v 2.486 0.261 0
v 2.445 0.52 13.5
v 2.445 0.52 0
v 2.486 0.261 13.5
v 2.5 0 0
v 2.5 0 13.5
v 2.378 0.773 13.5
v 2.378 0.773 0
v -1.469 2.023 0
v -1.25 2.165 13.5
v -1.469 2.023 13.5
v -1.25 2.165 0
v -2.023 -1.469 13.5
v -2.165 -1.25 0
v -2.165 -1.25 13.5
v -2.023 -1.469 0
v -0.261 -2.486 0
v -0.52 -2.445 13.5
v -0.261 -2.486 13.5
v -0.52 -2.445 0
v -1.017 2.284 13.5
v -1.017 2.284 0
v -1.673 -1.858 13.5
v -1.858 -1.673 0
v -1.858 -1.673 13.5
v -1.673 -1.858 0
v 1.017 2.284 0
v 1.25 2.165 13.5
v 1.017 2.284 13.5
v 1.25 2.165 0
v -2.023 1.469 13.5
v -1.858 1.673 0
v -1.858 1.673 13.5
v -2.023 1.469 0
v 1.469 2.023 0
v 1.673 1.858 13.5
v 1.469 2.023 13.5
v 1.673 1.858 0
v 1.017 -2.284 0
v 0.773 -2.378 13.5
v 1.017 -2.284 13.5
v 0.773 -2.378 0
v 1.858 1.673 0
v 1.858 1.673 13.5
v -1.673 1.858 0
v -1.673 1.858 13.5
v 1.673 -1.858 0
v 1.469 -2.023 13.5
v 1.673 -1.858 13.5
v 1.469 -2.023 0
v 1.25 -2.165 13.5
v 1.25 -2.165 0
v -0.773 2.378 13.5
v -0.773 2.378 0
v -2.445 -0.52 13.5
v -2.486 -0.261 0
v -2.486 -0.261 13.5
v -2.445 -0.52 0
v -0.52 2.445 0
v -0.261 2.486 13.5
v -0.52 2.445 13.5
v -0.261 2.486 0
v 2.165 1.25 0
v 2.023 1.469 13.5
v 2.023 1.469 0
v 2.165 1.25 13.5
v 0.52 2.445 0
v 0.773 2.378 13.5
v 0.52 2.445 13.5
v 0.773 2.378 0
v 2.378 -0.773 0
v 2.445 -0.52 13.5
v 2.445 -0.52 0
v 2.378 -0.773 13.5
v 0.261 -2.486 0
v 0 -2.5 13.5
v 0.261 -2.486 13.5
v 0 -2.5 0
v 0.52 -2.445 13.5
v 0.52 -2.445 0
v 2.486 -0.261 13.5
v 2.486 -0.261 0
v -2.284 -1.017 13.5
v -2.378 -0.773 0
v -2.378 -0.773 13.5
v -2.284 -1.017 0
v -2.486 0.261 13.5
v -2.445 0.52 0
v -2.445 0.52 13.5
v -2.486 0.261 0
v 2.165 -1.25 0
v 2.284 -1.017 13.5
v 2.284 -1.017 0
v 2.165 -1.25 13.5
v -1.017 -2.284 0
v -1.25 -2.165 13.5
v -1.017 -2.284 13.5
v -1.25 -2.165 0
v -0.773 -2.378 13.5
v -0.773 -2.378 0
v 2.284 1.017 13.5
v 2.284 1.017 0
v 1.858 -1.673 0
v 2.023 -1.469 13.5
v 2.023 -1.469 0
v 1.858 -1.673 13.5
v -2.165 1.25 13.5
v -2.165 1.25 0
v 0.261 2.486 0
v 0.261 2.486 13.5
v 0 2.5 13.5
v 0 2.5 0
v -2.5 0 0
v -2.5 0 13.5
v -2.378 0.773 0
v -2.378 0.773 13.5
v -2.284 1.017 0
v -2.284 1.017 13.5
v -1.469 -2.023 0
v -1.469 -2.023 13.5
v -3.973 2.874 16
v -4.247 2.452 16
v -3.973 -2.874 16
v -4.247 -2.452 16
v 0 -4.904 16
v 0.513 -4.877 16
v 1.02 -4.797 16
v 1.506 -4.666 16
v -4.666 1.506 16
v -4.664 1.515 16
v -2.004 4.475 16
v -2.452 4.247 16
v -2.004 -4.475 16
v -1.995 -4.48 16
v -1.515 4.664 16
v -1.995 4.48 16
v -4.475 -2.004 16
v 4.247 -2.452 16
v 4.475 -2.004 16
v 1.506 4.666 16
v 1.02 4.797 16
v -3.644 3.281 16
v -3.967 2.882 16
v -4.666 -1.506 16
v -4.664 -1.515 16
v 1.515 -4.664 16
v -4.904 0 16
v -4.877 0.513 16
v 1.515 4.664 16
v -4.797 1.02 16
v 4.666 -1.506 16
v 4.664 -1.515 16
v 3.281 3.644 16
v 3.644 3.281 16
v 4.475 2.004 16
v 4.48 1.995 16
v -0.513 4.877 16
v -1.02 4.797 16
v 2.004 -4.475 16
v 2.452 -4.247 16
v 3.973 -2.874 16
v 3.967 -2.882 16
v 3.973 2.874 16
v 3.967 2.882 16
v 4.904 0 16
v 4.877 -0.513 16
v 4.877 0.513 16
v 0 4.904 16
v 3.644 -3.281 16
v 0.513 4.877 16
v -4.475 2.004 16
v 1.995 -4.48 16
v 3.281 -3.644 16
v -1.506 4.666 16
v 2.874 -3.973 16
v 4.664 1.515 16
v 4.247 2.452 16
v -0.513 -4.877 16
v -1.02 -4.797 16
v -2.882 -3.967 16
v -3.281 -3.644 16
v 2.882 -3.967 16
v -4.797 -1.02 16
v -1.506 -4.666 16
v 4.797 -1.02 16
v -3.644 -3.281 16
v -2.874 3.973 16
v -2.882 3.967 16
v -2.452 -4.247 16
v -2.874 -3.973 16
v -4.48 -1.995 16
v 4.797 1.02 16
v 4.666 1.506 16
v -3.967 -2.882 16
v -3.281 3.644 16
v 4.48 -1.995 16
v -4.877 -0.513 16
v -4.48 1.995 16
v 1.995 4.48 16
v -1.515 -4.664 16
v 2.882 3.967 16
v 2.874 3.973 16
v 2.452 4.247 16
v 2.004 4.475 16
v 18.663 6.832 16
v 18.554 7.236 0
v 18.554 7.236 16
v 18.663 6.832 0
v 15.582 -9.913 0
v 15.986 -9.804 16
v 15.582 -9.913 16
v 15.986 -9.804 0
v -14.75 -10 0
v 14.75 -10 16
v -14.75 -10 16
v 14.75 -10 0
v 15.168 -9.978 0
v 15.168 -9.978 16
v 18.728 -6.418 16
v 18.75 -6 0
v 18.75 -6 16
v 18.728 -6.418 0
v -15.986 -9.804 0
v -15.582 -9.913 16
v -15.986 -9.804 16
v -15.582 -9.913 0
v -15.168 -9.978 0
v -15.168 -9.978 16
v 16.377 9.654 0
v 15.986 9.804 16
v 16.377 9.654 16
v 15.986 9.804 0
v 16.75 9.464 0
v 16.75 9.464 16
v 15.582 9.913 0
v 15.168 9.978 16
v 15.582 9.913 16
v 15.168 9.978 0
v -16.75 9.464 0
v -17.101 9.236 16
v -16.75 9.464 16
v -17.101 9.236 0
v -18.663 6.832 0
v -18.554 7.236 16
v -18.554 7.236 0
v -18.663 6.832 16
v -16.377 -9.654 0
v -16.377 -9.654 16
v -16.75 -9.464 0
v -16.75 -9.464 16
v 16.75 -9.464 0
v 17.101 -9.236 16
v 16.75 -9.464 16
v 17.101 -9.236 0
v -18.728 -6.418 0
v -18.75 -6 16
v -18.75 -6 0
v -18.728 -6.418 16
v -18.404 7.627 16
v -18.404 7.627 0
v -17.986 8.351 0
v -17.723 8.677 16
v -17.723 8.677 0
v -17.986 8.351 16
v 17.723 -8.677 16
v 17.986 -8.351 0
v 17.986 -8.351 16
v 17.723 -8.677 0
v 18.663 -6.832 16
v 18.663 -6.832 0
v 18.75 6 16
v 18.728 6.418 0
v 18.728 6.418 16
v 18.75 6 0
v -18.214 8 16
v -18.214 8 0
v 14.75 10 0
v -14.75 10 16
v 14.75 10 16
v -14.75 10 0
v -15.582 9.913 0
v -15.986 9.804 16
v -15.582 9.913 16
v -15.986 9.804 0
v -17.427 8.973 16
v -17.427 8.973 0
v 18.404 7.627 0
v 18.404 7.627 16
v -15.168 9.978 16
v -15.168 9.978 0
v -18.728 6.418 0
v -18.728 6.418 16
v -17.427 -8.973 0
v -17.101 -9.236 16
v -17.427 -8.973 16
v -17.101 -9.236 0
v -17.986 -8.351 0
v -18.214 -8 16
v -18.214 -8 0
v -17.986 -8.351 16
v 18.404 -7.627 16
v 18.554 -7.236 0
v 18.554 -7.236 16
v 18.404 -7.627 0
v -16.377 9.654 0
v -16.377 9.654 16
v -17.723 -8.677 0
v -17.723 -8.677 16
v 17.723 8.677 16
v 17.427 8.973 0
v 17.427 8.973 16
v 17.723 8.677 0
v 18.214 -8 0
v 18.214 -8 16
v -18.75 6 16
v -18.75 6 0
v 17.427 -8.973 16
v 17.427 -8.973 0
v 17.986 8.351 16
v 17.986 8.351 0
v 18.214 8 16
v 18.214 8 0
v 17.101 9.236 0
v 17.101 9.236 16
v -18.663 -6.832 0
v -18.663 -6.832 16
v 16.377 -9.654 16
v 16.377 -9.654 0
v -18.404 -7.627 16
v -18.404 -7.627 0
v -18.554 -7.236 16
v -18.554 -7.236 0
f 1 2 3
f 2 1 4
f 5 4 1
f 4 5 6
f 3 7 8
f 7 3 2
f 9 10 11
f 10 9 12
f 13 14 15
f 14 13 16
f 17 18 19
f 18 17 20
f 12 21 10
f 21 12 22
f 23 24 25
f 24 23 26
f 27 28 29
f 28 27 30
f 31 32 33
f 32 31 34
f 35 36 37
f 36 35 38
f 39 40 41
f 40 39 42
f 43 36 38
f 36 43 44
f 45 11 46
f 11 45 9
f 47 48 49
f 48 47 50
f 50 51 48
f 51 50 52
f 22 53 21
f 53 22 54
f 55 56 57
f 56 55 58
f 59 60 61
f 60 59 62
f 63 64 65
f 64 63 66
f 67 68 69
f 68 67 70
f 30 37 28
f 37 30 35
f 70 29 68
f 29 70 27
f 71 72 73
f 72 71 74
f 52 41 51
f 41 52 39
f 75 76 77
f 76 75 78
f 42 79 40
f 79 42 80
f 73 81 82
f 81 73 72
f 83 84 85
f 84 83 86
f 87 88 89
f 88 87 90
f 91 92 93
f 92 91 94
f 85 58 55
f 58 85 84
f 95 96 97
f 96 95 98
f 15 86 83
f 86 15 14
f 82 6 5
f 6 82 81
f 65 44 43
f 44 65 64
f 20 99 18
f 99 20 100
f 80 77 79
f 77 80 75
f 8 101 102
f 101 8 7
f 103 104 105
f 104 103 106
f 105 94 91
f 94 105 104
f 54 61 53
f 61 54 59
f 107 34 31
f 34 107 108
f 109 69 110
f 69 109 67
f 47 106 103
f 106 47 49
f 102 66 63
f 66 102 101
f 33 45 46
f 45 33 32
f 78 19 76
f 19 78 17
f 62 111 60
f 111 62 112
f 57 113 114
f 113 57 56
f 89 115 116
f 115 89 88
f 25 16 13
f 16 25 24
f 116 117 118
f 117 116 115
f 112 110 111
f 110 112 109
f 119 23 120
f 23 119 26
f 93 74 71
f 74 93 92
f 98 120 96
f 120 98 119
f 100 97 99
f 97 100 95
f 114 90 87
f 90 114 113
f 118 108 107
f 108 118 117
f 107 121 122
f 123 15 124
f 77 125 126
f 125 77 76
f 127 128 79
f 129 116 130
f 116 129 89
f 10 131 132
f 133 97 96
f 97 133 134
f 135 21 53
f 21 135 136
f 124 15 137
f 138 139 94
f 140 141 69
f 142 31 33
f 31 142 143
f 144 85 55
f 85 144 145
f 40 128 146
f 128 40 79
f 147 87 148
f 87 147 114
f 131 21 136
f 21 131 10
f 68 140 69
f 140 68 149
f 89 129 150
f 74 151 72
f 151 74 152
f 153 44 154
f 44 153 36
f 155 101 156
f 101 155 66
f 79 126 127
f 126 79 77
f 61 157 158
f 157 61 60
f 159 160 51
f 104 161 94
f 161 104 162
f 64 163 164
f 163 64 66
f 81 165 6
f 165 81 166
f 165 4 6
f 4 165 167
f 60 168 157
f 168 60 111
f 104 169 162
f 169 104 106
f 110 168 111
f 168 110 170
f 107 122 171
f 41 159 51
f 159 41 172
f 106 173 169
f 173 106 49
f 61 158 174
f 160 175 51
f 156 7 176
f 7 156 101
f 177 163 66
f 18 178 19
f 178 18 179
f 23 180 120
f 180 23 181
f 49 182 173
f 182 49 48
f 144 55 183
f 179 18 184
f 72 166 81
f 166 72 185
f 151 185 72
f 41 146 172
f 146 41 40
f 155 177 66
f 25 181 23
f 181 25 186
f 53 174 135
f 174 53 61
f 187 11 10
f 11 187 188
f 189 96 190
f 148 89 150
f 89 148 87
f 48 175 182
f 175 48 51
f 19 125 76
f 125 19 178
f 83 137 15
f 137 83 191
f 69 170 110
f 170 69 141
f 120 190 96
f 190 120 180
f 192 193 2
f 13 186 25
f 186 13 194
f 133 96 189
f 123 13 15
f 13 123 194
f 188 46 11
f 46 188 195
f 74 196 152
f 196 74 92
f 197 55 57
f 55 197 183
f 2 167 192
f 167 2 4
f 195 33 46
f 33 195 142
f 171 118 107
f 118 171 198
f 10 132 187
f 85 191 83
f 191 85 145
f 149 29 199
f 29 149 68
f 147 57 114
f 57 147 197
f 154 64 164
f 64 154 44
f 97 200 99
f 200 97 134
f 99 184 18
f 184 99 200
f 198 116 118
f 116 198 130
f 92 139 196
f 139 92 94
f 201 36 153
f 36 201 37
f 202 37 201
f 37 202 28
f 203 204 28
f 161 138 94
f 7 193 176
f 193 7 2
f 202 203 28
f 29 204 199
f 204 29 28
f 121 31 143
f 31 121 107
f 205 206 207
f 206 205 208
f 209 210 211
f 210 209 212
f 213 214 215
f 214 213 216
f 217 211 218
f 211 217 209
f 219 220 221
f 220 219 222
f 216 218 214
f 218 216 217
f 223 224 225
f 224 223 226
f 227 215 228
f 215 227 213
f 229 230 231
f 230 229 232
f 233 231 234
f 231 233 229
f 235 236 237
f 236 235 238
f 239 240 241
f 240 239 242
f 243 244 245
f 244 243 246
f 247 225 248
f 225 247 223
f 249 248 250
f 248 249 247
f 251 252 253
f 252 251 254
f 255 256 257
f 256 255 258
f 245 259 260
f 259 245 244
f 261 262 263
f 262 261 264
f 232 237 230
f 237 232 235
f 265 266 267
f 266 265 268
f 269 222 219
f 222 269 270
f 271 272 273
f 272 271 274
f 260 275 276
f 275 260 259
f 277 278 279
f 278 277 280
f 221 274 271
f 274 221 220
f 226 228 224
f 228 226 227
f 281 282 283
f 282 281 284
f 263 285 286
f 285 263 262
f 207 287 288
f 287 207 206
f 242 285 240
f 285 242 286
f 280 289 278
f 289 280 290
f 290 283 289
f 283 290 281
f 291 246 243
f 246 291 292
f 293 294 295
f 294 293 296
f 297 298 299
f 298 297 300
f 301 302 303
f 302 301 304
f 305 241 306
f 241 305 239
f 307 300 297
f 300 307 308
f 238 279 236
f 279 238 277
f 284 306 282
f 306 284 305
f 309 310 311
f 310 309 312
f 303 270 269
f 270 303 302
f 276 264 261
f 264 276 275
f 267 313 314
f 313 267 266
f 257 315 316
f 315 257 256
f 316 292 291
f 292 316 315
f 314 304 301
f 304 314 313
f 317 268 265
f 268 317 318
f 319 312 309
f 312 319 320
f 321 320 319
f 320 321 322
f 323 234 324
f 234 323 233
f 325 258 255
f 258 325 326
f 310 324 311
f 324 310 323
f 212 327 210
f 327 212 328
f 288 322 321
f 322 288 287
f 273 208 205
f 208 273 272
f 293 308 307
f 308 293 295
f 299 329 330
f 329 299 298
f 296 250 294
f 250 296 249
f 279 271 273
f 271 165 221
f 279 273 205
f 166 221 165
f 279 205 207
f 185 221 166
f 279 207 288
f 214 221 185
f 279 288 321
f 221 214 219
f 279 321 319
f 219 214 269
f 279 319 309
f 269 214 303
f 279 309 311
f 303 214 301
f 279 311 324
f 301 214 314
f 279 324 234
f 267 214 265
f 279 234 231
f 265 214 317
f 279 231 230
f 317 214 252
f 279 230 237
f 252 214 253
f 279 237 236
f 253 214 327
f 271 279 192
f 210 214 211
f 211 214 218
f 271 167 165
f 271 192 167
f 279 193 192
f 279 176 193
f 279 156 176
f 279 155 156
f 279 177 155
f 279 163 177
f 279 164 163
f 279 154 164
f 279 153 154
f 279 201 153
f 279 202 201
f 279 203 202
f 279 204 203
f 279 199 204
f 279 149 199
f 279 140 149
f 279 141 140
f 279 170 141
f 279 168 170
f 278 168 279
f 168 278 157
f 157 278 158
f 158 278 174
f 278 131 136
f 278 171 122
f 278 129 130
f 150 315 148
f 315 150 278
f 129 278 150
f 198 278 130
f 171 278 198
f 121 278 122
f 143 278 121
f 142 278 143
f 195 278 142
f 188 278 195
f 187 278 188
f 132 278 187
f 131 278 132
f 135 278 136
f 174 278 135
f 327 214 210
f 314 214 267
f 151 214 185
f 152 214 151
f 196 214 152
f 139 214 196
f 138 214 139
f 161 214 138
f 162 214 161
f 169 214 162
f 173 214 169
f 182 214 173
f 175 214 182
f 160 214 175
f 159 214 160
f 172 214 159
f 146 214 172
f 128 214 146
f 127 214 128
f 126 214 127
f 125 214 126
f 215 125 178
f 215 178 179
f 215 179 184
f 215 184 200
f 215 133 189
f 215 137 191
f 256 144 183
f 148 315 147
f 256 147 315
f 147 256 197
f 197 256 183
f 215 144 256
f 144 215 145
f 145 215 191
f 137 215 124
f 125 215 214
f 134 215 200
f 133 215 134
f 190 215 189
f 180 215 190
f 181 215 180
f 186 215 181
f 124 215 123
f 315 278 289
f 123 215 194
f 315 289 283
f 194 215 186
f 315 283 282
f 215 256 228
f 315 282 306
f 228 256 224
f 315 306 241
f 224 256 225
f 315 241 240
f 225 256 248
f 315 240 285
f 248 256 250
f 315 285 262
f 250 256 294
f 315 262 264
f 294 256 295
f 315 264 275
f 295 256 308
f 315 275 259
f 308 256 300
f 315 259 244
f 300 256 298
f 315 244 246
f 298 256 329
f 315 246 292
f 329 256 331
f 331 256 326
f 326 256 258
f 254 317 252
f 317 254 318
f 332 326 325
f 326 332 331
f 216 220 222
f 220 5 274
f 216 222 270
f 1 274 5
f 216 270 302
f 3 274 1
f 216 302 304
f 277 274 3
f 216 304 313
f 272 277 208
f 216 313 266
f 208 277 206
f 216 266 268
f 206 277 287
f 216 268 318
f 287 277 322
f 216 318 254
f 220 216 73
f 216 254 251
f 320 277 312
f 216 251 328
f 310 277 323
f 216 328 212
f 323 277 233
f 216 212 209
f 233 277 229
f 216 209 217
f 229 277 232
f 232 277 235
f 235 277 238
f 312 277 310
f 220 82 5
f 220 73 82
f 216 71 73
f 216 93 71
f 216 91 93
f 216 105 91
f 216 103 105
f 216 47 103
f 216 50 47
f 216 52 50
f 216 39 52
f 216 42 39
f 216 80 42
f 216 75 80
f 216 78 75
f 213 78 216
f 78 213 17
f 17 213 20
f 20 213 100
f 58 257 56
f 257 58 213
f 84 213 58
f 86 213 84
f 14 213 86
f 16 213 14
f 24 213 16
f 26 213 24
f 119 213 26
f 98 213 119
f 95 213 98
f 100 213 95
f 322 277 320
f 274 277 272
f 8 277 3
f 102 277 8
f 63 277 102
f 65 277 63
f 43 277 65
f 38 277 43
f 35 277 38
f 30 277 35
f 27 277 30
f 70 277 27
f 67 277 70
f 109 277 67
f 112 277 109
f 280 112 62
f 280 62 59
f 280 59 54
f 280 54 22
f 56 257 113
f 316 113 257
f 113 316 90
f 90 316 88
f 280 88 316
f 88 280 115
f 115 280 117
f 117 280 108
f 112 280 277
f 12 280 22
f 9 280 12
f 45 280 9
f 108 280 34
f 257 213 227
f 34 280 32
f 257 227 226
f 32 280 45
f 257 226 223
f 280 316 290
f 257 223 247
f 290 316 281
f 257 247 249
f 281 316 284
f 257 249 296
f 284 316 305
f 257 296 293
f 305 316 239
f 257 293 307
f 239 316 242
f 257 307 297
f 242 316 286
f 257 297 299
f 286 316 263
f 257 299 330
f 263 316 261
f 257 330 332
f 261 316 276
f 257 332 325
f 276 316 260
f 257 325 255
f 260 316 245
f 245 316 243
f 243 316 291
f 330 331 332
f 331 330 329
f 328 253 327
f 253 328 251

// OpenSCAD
// Wall Mount Tab for Modular Shelf System
// Glue to the flat outside wall of a shelf piece, toward the back.
// Countersunk screw hole for wall mounting.
// Print flat (screw hole facing up).
// Units: millimeters

// --- Shelf size (change to match your shelf piece) ---
shelf_width = 87.5;  // 175 or 87.5

// --- Shelf Parameters (must match shelf.scad) ---
corner_radius = 20;  // shelf corner rounding radius

// --- Tab Parameters ---
tab_thickness  = 16;    // how far tab protrudes from shelf wall
tab_corner_r   = 4;    // rounding on tab edges
tab_height     = 20;   // extent along shelf depth (front-to-back)
screw_count    = 1;    // number of screw holes evenly spaced
screw_shaft_d  = 5;    // clearance hole for screw shaft
screw_head_d   = 10;   // countersink diameter
screw_head_h   = 2.5;  // countersink depth

// --- Derived ---
flat_width = shelf_width - 2 * corner_radius;
tab_width  = flat_width - 10;  // 5mm margin each side of flat zone

$fn = 60;

module mount_tab() {
    difference() {
        // Rounded rectangle body
        linear_extrude(height = tab_thickness)
            offset(r = tab_corner_r)
                square([tab_width - 2 * tab_corner_r,
                        tab_height - 2 * tab_corner_r], center = true);

        // Countersunk screw holes, evenly spaced along width
        for (i = [0 : screw_count - 1]) {
            x = -tab_width / 2 + tab_width / screw_count * (i + 0.5);
            translate([x, 0, -0.1]) {
                cylinder(d = screw_shaft_d, h = tab_thickness + 0.2);
                translate([0, 0, tab_thickness - screw_head_h + 0.1])
                    cylinder(d1 = screw_shaft_d, d2 = screw_head_d,
                             h = screw_head_h + 0.1);
            }
        }
    }
}

mount_tab();
